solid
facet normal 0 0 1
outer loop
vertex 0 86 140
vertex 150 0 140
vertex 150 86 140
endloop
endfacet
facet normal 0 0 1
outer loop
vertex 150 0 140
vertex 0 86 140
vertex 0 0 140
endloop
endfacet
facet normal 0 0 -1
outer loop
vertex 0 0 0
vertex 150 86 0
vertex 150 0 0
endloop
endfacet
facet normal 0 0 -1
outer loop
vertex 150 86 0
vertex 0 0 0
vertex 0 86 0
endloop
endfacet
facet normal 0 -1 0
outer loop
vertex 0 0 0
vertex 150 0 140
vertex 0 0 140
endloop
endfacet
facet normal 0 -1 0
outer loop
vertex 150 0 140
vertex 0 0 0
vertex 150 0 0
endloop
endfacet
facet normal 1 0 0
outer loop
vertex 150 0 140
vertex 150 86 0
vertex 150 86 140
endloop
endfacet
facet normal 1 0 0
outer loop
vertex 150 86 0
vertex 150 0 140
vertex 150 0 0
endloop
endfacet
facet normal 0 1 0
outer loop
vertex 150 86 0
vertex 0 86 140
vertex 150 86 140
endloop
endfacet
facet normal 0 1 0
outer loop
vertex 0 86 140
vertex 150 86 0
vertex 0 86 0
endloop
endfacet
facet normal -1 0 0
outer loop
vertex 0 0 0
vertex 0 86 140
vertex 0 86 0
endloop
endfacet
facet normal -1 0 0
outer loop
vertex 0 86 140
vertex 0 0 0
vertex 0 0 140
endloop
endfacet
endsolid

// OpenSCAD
// PSU model.

$fn = 50;
OX = 0.01;

module psu() {
    color([1.0, 1.0, 1.0, 0.5]) cube([150, 86, 140]);
}

// Example:
psu();
